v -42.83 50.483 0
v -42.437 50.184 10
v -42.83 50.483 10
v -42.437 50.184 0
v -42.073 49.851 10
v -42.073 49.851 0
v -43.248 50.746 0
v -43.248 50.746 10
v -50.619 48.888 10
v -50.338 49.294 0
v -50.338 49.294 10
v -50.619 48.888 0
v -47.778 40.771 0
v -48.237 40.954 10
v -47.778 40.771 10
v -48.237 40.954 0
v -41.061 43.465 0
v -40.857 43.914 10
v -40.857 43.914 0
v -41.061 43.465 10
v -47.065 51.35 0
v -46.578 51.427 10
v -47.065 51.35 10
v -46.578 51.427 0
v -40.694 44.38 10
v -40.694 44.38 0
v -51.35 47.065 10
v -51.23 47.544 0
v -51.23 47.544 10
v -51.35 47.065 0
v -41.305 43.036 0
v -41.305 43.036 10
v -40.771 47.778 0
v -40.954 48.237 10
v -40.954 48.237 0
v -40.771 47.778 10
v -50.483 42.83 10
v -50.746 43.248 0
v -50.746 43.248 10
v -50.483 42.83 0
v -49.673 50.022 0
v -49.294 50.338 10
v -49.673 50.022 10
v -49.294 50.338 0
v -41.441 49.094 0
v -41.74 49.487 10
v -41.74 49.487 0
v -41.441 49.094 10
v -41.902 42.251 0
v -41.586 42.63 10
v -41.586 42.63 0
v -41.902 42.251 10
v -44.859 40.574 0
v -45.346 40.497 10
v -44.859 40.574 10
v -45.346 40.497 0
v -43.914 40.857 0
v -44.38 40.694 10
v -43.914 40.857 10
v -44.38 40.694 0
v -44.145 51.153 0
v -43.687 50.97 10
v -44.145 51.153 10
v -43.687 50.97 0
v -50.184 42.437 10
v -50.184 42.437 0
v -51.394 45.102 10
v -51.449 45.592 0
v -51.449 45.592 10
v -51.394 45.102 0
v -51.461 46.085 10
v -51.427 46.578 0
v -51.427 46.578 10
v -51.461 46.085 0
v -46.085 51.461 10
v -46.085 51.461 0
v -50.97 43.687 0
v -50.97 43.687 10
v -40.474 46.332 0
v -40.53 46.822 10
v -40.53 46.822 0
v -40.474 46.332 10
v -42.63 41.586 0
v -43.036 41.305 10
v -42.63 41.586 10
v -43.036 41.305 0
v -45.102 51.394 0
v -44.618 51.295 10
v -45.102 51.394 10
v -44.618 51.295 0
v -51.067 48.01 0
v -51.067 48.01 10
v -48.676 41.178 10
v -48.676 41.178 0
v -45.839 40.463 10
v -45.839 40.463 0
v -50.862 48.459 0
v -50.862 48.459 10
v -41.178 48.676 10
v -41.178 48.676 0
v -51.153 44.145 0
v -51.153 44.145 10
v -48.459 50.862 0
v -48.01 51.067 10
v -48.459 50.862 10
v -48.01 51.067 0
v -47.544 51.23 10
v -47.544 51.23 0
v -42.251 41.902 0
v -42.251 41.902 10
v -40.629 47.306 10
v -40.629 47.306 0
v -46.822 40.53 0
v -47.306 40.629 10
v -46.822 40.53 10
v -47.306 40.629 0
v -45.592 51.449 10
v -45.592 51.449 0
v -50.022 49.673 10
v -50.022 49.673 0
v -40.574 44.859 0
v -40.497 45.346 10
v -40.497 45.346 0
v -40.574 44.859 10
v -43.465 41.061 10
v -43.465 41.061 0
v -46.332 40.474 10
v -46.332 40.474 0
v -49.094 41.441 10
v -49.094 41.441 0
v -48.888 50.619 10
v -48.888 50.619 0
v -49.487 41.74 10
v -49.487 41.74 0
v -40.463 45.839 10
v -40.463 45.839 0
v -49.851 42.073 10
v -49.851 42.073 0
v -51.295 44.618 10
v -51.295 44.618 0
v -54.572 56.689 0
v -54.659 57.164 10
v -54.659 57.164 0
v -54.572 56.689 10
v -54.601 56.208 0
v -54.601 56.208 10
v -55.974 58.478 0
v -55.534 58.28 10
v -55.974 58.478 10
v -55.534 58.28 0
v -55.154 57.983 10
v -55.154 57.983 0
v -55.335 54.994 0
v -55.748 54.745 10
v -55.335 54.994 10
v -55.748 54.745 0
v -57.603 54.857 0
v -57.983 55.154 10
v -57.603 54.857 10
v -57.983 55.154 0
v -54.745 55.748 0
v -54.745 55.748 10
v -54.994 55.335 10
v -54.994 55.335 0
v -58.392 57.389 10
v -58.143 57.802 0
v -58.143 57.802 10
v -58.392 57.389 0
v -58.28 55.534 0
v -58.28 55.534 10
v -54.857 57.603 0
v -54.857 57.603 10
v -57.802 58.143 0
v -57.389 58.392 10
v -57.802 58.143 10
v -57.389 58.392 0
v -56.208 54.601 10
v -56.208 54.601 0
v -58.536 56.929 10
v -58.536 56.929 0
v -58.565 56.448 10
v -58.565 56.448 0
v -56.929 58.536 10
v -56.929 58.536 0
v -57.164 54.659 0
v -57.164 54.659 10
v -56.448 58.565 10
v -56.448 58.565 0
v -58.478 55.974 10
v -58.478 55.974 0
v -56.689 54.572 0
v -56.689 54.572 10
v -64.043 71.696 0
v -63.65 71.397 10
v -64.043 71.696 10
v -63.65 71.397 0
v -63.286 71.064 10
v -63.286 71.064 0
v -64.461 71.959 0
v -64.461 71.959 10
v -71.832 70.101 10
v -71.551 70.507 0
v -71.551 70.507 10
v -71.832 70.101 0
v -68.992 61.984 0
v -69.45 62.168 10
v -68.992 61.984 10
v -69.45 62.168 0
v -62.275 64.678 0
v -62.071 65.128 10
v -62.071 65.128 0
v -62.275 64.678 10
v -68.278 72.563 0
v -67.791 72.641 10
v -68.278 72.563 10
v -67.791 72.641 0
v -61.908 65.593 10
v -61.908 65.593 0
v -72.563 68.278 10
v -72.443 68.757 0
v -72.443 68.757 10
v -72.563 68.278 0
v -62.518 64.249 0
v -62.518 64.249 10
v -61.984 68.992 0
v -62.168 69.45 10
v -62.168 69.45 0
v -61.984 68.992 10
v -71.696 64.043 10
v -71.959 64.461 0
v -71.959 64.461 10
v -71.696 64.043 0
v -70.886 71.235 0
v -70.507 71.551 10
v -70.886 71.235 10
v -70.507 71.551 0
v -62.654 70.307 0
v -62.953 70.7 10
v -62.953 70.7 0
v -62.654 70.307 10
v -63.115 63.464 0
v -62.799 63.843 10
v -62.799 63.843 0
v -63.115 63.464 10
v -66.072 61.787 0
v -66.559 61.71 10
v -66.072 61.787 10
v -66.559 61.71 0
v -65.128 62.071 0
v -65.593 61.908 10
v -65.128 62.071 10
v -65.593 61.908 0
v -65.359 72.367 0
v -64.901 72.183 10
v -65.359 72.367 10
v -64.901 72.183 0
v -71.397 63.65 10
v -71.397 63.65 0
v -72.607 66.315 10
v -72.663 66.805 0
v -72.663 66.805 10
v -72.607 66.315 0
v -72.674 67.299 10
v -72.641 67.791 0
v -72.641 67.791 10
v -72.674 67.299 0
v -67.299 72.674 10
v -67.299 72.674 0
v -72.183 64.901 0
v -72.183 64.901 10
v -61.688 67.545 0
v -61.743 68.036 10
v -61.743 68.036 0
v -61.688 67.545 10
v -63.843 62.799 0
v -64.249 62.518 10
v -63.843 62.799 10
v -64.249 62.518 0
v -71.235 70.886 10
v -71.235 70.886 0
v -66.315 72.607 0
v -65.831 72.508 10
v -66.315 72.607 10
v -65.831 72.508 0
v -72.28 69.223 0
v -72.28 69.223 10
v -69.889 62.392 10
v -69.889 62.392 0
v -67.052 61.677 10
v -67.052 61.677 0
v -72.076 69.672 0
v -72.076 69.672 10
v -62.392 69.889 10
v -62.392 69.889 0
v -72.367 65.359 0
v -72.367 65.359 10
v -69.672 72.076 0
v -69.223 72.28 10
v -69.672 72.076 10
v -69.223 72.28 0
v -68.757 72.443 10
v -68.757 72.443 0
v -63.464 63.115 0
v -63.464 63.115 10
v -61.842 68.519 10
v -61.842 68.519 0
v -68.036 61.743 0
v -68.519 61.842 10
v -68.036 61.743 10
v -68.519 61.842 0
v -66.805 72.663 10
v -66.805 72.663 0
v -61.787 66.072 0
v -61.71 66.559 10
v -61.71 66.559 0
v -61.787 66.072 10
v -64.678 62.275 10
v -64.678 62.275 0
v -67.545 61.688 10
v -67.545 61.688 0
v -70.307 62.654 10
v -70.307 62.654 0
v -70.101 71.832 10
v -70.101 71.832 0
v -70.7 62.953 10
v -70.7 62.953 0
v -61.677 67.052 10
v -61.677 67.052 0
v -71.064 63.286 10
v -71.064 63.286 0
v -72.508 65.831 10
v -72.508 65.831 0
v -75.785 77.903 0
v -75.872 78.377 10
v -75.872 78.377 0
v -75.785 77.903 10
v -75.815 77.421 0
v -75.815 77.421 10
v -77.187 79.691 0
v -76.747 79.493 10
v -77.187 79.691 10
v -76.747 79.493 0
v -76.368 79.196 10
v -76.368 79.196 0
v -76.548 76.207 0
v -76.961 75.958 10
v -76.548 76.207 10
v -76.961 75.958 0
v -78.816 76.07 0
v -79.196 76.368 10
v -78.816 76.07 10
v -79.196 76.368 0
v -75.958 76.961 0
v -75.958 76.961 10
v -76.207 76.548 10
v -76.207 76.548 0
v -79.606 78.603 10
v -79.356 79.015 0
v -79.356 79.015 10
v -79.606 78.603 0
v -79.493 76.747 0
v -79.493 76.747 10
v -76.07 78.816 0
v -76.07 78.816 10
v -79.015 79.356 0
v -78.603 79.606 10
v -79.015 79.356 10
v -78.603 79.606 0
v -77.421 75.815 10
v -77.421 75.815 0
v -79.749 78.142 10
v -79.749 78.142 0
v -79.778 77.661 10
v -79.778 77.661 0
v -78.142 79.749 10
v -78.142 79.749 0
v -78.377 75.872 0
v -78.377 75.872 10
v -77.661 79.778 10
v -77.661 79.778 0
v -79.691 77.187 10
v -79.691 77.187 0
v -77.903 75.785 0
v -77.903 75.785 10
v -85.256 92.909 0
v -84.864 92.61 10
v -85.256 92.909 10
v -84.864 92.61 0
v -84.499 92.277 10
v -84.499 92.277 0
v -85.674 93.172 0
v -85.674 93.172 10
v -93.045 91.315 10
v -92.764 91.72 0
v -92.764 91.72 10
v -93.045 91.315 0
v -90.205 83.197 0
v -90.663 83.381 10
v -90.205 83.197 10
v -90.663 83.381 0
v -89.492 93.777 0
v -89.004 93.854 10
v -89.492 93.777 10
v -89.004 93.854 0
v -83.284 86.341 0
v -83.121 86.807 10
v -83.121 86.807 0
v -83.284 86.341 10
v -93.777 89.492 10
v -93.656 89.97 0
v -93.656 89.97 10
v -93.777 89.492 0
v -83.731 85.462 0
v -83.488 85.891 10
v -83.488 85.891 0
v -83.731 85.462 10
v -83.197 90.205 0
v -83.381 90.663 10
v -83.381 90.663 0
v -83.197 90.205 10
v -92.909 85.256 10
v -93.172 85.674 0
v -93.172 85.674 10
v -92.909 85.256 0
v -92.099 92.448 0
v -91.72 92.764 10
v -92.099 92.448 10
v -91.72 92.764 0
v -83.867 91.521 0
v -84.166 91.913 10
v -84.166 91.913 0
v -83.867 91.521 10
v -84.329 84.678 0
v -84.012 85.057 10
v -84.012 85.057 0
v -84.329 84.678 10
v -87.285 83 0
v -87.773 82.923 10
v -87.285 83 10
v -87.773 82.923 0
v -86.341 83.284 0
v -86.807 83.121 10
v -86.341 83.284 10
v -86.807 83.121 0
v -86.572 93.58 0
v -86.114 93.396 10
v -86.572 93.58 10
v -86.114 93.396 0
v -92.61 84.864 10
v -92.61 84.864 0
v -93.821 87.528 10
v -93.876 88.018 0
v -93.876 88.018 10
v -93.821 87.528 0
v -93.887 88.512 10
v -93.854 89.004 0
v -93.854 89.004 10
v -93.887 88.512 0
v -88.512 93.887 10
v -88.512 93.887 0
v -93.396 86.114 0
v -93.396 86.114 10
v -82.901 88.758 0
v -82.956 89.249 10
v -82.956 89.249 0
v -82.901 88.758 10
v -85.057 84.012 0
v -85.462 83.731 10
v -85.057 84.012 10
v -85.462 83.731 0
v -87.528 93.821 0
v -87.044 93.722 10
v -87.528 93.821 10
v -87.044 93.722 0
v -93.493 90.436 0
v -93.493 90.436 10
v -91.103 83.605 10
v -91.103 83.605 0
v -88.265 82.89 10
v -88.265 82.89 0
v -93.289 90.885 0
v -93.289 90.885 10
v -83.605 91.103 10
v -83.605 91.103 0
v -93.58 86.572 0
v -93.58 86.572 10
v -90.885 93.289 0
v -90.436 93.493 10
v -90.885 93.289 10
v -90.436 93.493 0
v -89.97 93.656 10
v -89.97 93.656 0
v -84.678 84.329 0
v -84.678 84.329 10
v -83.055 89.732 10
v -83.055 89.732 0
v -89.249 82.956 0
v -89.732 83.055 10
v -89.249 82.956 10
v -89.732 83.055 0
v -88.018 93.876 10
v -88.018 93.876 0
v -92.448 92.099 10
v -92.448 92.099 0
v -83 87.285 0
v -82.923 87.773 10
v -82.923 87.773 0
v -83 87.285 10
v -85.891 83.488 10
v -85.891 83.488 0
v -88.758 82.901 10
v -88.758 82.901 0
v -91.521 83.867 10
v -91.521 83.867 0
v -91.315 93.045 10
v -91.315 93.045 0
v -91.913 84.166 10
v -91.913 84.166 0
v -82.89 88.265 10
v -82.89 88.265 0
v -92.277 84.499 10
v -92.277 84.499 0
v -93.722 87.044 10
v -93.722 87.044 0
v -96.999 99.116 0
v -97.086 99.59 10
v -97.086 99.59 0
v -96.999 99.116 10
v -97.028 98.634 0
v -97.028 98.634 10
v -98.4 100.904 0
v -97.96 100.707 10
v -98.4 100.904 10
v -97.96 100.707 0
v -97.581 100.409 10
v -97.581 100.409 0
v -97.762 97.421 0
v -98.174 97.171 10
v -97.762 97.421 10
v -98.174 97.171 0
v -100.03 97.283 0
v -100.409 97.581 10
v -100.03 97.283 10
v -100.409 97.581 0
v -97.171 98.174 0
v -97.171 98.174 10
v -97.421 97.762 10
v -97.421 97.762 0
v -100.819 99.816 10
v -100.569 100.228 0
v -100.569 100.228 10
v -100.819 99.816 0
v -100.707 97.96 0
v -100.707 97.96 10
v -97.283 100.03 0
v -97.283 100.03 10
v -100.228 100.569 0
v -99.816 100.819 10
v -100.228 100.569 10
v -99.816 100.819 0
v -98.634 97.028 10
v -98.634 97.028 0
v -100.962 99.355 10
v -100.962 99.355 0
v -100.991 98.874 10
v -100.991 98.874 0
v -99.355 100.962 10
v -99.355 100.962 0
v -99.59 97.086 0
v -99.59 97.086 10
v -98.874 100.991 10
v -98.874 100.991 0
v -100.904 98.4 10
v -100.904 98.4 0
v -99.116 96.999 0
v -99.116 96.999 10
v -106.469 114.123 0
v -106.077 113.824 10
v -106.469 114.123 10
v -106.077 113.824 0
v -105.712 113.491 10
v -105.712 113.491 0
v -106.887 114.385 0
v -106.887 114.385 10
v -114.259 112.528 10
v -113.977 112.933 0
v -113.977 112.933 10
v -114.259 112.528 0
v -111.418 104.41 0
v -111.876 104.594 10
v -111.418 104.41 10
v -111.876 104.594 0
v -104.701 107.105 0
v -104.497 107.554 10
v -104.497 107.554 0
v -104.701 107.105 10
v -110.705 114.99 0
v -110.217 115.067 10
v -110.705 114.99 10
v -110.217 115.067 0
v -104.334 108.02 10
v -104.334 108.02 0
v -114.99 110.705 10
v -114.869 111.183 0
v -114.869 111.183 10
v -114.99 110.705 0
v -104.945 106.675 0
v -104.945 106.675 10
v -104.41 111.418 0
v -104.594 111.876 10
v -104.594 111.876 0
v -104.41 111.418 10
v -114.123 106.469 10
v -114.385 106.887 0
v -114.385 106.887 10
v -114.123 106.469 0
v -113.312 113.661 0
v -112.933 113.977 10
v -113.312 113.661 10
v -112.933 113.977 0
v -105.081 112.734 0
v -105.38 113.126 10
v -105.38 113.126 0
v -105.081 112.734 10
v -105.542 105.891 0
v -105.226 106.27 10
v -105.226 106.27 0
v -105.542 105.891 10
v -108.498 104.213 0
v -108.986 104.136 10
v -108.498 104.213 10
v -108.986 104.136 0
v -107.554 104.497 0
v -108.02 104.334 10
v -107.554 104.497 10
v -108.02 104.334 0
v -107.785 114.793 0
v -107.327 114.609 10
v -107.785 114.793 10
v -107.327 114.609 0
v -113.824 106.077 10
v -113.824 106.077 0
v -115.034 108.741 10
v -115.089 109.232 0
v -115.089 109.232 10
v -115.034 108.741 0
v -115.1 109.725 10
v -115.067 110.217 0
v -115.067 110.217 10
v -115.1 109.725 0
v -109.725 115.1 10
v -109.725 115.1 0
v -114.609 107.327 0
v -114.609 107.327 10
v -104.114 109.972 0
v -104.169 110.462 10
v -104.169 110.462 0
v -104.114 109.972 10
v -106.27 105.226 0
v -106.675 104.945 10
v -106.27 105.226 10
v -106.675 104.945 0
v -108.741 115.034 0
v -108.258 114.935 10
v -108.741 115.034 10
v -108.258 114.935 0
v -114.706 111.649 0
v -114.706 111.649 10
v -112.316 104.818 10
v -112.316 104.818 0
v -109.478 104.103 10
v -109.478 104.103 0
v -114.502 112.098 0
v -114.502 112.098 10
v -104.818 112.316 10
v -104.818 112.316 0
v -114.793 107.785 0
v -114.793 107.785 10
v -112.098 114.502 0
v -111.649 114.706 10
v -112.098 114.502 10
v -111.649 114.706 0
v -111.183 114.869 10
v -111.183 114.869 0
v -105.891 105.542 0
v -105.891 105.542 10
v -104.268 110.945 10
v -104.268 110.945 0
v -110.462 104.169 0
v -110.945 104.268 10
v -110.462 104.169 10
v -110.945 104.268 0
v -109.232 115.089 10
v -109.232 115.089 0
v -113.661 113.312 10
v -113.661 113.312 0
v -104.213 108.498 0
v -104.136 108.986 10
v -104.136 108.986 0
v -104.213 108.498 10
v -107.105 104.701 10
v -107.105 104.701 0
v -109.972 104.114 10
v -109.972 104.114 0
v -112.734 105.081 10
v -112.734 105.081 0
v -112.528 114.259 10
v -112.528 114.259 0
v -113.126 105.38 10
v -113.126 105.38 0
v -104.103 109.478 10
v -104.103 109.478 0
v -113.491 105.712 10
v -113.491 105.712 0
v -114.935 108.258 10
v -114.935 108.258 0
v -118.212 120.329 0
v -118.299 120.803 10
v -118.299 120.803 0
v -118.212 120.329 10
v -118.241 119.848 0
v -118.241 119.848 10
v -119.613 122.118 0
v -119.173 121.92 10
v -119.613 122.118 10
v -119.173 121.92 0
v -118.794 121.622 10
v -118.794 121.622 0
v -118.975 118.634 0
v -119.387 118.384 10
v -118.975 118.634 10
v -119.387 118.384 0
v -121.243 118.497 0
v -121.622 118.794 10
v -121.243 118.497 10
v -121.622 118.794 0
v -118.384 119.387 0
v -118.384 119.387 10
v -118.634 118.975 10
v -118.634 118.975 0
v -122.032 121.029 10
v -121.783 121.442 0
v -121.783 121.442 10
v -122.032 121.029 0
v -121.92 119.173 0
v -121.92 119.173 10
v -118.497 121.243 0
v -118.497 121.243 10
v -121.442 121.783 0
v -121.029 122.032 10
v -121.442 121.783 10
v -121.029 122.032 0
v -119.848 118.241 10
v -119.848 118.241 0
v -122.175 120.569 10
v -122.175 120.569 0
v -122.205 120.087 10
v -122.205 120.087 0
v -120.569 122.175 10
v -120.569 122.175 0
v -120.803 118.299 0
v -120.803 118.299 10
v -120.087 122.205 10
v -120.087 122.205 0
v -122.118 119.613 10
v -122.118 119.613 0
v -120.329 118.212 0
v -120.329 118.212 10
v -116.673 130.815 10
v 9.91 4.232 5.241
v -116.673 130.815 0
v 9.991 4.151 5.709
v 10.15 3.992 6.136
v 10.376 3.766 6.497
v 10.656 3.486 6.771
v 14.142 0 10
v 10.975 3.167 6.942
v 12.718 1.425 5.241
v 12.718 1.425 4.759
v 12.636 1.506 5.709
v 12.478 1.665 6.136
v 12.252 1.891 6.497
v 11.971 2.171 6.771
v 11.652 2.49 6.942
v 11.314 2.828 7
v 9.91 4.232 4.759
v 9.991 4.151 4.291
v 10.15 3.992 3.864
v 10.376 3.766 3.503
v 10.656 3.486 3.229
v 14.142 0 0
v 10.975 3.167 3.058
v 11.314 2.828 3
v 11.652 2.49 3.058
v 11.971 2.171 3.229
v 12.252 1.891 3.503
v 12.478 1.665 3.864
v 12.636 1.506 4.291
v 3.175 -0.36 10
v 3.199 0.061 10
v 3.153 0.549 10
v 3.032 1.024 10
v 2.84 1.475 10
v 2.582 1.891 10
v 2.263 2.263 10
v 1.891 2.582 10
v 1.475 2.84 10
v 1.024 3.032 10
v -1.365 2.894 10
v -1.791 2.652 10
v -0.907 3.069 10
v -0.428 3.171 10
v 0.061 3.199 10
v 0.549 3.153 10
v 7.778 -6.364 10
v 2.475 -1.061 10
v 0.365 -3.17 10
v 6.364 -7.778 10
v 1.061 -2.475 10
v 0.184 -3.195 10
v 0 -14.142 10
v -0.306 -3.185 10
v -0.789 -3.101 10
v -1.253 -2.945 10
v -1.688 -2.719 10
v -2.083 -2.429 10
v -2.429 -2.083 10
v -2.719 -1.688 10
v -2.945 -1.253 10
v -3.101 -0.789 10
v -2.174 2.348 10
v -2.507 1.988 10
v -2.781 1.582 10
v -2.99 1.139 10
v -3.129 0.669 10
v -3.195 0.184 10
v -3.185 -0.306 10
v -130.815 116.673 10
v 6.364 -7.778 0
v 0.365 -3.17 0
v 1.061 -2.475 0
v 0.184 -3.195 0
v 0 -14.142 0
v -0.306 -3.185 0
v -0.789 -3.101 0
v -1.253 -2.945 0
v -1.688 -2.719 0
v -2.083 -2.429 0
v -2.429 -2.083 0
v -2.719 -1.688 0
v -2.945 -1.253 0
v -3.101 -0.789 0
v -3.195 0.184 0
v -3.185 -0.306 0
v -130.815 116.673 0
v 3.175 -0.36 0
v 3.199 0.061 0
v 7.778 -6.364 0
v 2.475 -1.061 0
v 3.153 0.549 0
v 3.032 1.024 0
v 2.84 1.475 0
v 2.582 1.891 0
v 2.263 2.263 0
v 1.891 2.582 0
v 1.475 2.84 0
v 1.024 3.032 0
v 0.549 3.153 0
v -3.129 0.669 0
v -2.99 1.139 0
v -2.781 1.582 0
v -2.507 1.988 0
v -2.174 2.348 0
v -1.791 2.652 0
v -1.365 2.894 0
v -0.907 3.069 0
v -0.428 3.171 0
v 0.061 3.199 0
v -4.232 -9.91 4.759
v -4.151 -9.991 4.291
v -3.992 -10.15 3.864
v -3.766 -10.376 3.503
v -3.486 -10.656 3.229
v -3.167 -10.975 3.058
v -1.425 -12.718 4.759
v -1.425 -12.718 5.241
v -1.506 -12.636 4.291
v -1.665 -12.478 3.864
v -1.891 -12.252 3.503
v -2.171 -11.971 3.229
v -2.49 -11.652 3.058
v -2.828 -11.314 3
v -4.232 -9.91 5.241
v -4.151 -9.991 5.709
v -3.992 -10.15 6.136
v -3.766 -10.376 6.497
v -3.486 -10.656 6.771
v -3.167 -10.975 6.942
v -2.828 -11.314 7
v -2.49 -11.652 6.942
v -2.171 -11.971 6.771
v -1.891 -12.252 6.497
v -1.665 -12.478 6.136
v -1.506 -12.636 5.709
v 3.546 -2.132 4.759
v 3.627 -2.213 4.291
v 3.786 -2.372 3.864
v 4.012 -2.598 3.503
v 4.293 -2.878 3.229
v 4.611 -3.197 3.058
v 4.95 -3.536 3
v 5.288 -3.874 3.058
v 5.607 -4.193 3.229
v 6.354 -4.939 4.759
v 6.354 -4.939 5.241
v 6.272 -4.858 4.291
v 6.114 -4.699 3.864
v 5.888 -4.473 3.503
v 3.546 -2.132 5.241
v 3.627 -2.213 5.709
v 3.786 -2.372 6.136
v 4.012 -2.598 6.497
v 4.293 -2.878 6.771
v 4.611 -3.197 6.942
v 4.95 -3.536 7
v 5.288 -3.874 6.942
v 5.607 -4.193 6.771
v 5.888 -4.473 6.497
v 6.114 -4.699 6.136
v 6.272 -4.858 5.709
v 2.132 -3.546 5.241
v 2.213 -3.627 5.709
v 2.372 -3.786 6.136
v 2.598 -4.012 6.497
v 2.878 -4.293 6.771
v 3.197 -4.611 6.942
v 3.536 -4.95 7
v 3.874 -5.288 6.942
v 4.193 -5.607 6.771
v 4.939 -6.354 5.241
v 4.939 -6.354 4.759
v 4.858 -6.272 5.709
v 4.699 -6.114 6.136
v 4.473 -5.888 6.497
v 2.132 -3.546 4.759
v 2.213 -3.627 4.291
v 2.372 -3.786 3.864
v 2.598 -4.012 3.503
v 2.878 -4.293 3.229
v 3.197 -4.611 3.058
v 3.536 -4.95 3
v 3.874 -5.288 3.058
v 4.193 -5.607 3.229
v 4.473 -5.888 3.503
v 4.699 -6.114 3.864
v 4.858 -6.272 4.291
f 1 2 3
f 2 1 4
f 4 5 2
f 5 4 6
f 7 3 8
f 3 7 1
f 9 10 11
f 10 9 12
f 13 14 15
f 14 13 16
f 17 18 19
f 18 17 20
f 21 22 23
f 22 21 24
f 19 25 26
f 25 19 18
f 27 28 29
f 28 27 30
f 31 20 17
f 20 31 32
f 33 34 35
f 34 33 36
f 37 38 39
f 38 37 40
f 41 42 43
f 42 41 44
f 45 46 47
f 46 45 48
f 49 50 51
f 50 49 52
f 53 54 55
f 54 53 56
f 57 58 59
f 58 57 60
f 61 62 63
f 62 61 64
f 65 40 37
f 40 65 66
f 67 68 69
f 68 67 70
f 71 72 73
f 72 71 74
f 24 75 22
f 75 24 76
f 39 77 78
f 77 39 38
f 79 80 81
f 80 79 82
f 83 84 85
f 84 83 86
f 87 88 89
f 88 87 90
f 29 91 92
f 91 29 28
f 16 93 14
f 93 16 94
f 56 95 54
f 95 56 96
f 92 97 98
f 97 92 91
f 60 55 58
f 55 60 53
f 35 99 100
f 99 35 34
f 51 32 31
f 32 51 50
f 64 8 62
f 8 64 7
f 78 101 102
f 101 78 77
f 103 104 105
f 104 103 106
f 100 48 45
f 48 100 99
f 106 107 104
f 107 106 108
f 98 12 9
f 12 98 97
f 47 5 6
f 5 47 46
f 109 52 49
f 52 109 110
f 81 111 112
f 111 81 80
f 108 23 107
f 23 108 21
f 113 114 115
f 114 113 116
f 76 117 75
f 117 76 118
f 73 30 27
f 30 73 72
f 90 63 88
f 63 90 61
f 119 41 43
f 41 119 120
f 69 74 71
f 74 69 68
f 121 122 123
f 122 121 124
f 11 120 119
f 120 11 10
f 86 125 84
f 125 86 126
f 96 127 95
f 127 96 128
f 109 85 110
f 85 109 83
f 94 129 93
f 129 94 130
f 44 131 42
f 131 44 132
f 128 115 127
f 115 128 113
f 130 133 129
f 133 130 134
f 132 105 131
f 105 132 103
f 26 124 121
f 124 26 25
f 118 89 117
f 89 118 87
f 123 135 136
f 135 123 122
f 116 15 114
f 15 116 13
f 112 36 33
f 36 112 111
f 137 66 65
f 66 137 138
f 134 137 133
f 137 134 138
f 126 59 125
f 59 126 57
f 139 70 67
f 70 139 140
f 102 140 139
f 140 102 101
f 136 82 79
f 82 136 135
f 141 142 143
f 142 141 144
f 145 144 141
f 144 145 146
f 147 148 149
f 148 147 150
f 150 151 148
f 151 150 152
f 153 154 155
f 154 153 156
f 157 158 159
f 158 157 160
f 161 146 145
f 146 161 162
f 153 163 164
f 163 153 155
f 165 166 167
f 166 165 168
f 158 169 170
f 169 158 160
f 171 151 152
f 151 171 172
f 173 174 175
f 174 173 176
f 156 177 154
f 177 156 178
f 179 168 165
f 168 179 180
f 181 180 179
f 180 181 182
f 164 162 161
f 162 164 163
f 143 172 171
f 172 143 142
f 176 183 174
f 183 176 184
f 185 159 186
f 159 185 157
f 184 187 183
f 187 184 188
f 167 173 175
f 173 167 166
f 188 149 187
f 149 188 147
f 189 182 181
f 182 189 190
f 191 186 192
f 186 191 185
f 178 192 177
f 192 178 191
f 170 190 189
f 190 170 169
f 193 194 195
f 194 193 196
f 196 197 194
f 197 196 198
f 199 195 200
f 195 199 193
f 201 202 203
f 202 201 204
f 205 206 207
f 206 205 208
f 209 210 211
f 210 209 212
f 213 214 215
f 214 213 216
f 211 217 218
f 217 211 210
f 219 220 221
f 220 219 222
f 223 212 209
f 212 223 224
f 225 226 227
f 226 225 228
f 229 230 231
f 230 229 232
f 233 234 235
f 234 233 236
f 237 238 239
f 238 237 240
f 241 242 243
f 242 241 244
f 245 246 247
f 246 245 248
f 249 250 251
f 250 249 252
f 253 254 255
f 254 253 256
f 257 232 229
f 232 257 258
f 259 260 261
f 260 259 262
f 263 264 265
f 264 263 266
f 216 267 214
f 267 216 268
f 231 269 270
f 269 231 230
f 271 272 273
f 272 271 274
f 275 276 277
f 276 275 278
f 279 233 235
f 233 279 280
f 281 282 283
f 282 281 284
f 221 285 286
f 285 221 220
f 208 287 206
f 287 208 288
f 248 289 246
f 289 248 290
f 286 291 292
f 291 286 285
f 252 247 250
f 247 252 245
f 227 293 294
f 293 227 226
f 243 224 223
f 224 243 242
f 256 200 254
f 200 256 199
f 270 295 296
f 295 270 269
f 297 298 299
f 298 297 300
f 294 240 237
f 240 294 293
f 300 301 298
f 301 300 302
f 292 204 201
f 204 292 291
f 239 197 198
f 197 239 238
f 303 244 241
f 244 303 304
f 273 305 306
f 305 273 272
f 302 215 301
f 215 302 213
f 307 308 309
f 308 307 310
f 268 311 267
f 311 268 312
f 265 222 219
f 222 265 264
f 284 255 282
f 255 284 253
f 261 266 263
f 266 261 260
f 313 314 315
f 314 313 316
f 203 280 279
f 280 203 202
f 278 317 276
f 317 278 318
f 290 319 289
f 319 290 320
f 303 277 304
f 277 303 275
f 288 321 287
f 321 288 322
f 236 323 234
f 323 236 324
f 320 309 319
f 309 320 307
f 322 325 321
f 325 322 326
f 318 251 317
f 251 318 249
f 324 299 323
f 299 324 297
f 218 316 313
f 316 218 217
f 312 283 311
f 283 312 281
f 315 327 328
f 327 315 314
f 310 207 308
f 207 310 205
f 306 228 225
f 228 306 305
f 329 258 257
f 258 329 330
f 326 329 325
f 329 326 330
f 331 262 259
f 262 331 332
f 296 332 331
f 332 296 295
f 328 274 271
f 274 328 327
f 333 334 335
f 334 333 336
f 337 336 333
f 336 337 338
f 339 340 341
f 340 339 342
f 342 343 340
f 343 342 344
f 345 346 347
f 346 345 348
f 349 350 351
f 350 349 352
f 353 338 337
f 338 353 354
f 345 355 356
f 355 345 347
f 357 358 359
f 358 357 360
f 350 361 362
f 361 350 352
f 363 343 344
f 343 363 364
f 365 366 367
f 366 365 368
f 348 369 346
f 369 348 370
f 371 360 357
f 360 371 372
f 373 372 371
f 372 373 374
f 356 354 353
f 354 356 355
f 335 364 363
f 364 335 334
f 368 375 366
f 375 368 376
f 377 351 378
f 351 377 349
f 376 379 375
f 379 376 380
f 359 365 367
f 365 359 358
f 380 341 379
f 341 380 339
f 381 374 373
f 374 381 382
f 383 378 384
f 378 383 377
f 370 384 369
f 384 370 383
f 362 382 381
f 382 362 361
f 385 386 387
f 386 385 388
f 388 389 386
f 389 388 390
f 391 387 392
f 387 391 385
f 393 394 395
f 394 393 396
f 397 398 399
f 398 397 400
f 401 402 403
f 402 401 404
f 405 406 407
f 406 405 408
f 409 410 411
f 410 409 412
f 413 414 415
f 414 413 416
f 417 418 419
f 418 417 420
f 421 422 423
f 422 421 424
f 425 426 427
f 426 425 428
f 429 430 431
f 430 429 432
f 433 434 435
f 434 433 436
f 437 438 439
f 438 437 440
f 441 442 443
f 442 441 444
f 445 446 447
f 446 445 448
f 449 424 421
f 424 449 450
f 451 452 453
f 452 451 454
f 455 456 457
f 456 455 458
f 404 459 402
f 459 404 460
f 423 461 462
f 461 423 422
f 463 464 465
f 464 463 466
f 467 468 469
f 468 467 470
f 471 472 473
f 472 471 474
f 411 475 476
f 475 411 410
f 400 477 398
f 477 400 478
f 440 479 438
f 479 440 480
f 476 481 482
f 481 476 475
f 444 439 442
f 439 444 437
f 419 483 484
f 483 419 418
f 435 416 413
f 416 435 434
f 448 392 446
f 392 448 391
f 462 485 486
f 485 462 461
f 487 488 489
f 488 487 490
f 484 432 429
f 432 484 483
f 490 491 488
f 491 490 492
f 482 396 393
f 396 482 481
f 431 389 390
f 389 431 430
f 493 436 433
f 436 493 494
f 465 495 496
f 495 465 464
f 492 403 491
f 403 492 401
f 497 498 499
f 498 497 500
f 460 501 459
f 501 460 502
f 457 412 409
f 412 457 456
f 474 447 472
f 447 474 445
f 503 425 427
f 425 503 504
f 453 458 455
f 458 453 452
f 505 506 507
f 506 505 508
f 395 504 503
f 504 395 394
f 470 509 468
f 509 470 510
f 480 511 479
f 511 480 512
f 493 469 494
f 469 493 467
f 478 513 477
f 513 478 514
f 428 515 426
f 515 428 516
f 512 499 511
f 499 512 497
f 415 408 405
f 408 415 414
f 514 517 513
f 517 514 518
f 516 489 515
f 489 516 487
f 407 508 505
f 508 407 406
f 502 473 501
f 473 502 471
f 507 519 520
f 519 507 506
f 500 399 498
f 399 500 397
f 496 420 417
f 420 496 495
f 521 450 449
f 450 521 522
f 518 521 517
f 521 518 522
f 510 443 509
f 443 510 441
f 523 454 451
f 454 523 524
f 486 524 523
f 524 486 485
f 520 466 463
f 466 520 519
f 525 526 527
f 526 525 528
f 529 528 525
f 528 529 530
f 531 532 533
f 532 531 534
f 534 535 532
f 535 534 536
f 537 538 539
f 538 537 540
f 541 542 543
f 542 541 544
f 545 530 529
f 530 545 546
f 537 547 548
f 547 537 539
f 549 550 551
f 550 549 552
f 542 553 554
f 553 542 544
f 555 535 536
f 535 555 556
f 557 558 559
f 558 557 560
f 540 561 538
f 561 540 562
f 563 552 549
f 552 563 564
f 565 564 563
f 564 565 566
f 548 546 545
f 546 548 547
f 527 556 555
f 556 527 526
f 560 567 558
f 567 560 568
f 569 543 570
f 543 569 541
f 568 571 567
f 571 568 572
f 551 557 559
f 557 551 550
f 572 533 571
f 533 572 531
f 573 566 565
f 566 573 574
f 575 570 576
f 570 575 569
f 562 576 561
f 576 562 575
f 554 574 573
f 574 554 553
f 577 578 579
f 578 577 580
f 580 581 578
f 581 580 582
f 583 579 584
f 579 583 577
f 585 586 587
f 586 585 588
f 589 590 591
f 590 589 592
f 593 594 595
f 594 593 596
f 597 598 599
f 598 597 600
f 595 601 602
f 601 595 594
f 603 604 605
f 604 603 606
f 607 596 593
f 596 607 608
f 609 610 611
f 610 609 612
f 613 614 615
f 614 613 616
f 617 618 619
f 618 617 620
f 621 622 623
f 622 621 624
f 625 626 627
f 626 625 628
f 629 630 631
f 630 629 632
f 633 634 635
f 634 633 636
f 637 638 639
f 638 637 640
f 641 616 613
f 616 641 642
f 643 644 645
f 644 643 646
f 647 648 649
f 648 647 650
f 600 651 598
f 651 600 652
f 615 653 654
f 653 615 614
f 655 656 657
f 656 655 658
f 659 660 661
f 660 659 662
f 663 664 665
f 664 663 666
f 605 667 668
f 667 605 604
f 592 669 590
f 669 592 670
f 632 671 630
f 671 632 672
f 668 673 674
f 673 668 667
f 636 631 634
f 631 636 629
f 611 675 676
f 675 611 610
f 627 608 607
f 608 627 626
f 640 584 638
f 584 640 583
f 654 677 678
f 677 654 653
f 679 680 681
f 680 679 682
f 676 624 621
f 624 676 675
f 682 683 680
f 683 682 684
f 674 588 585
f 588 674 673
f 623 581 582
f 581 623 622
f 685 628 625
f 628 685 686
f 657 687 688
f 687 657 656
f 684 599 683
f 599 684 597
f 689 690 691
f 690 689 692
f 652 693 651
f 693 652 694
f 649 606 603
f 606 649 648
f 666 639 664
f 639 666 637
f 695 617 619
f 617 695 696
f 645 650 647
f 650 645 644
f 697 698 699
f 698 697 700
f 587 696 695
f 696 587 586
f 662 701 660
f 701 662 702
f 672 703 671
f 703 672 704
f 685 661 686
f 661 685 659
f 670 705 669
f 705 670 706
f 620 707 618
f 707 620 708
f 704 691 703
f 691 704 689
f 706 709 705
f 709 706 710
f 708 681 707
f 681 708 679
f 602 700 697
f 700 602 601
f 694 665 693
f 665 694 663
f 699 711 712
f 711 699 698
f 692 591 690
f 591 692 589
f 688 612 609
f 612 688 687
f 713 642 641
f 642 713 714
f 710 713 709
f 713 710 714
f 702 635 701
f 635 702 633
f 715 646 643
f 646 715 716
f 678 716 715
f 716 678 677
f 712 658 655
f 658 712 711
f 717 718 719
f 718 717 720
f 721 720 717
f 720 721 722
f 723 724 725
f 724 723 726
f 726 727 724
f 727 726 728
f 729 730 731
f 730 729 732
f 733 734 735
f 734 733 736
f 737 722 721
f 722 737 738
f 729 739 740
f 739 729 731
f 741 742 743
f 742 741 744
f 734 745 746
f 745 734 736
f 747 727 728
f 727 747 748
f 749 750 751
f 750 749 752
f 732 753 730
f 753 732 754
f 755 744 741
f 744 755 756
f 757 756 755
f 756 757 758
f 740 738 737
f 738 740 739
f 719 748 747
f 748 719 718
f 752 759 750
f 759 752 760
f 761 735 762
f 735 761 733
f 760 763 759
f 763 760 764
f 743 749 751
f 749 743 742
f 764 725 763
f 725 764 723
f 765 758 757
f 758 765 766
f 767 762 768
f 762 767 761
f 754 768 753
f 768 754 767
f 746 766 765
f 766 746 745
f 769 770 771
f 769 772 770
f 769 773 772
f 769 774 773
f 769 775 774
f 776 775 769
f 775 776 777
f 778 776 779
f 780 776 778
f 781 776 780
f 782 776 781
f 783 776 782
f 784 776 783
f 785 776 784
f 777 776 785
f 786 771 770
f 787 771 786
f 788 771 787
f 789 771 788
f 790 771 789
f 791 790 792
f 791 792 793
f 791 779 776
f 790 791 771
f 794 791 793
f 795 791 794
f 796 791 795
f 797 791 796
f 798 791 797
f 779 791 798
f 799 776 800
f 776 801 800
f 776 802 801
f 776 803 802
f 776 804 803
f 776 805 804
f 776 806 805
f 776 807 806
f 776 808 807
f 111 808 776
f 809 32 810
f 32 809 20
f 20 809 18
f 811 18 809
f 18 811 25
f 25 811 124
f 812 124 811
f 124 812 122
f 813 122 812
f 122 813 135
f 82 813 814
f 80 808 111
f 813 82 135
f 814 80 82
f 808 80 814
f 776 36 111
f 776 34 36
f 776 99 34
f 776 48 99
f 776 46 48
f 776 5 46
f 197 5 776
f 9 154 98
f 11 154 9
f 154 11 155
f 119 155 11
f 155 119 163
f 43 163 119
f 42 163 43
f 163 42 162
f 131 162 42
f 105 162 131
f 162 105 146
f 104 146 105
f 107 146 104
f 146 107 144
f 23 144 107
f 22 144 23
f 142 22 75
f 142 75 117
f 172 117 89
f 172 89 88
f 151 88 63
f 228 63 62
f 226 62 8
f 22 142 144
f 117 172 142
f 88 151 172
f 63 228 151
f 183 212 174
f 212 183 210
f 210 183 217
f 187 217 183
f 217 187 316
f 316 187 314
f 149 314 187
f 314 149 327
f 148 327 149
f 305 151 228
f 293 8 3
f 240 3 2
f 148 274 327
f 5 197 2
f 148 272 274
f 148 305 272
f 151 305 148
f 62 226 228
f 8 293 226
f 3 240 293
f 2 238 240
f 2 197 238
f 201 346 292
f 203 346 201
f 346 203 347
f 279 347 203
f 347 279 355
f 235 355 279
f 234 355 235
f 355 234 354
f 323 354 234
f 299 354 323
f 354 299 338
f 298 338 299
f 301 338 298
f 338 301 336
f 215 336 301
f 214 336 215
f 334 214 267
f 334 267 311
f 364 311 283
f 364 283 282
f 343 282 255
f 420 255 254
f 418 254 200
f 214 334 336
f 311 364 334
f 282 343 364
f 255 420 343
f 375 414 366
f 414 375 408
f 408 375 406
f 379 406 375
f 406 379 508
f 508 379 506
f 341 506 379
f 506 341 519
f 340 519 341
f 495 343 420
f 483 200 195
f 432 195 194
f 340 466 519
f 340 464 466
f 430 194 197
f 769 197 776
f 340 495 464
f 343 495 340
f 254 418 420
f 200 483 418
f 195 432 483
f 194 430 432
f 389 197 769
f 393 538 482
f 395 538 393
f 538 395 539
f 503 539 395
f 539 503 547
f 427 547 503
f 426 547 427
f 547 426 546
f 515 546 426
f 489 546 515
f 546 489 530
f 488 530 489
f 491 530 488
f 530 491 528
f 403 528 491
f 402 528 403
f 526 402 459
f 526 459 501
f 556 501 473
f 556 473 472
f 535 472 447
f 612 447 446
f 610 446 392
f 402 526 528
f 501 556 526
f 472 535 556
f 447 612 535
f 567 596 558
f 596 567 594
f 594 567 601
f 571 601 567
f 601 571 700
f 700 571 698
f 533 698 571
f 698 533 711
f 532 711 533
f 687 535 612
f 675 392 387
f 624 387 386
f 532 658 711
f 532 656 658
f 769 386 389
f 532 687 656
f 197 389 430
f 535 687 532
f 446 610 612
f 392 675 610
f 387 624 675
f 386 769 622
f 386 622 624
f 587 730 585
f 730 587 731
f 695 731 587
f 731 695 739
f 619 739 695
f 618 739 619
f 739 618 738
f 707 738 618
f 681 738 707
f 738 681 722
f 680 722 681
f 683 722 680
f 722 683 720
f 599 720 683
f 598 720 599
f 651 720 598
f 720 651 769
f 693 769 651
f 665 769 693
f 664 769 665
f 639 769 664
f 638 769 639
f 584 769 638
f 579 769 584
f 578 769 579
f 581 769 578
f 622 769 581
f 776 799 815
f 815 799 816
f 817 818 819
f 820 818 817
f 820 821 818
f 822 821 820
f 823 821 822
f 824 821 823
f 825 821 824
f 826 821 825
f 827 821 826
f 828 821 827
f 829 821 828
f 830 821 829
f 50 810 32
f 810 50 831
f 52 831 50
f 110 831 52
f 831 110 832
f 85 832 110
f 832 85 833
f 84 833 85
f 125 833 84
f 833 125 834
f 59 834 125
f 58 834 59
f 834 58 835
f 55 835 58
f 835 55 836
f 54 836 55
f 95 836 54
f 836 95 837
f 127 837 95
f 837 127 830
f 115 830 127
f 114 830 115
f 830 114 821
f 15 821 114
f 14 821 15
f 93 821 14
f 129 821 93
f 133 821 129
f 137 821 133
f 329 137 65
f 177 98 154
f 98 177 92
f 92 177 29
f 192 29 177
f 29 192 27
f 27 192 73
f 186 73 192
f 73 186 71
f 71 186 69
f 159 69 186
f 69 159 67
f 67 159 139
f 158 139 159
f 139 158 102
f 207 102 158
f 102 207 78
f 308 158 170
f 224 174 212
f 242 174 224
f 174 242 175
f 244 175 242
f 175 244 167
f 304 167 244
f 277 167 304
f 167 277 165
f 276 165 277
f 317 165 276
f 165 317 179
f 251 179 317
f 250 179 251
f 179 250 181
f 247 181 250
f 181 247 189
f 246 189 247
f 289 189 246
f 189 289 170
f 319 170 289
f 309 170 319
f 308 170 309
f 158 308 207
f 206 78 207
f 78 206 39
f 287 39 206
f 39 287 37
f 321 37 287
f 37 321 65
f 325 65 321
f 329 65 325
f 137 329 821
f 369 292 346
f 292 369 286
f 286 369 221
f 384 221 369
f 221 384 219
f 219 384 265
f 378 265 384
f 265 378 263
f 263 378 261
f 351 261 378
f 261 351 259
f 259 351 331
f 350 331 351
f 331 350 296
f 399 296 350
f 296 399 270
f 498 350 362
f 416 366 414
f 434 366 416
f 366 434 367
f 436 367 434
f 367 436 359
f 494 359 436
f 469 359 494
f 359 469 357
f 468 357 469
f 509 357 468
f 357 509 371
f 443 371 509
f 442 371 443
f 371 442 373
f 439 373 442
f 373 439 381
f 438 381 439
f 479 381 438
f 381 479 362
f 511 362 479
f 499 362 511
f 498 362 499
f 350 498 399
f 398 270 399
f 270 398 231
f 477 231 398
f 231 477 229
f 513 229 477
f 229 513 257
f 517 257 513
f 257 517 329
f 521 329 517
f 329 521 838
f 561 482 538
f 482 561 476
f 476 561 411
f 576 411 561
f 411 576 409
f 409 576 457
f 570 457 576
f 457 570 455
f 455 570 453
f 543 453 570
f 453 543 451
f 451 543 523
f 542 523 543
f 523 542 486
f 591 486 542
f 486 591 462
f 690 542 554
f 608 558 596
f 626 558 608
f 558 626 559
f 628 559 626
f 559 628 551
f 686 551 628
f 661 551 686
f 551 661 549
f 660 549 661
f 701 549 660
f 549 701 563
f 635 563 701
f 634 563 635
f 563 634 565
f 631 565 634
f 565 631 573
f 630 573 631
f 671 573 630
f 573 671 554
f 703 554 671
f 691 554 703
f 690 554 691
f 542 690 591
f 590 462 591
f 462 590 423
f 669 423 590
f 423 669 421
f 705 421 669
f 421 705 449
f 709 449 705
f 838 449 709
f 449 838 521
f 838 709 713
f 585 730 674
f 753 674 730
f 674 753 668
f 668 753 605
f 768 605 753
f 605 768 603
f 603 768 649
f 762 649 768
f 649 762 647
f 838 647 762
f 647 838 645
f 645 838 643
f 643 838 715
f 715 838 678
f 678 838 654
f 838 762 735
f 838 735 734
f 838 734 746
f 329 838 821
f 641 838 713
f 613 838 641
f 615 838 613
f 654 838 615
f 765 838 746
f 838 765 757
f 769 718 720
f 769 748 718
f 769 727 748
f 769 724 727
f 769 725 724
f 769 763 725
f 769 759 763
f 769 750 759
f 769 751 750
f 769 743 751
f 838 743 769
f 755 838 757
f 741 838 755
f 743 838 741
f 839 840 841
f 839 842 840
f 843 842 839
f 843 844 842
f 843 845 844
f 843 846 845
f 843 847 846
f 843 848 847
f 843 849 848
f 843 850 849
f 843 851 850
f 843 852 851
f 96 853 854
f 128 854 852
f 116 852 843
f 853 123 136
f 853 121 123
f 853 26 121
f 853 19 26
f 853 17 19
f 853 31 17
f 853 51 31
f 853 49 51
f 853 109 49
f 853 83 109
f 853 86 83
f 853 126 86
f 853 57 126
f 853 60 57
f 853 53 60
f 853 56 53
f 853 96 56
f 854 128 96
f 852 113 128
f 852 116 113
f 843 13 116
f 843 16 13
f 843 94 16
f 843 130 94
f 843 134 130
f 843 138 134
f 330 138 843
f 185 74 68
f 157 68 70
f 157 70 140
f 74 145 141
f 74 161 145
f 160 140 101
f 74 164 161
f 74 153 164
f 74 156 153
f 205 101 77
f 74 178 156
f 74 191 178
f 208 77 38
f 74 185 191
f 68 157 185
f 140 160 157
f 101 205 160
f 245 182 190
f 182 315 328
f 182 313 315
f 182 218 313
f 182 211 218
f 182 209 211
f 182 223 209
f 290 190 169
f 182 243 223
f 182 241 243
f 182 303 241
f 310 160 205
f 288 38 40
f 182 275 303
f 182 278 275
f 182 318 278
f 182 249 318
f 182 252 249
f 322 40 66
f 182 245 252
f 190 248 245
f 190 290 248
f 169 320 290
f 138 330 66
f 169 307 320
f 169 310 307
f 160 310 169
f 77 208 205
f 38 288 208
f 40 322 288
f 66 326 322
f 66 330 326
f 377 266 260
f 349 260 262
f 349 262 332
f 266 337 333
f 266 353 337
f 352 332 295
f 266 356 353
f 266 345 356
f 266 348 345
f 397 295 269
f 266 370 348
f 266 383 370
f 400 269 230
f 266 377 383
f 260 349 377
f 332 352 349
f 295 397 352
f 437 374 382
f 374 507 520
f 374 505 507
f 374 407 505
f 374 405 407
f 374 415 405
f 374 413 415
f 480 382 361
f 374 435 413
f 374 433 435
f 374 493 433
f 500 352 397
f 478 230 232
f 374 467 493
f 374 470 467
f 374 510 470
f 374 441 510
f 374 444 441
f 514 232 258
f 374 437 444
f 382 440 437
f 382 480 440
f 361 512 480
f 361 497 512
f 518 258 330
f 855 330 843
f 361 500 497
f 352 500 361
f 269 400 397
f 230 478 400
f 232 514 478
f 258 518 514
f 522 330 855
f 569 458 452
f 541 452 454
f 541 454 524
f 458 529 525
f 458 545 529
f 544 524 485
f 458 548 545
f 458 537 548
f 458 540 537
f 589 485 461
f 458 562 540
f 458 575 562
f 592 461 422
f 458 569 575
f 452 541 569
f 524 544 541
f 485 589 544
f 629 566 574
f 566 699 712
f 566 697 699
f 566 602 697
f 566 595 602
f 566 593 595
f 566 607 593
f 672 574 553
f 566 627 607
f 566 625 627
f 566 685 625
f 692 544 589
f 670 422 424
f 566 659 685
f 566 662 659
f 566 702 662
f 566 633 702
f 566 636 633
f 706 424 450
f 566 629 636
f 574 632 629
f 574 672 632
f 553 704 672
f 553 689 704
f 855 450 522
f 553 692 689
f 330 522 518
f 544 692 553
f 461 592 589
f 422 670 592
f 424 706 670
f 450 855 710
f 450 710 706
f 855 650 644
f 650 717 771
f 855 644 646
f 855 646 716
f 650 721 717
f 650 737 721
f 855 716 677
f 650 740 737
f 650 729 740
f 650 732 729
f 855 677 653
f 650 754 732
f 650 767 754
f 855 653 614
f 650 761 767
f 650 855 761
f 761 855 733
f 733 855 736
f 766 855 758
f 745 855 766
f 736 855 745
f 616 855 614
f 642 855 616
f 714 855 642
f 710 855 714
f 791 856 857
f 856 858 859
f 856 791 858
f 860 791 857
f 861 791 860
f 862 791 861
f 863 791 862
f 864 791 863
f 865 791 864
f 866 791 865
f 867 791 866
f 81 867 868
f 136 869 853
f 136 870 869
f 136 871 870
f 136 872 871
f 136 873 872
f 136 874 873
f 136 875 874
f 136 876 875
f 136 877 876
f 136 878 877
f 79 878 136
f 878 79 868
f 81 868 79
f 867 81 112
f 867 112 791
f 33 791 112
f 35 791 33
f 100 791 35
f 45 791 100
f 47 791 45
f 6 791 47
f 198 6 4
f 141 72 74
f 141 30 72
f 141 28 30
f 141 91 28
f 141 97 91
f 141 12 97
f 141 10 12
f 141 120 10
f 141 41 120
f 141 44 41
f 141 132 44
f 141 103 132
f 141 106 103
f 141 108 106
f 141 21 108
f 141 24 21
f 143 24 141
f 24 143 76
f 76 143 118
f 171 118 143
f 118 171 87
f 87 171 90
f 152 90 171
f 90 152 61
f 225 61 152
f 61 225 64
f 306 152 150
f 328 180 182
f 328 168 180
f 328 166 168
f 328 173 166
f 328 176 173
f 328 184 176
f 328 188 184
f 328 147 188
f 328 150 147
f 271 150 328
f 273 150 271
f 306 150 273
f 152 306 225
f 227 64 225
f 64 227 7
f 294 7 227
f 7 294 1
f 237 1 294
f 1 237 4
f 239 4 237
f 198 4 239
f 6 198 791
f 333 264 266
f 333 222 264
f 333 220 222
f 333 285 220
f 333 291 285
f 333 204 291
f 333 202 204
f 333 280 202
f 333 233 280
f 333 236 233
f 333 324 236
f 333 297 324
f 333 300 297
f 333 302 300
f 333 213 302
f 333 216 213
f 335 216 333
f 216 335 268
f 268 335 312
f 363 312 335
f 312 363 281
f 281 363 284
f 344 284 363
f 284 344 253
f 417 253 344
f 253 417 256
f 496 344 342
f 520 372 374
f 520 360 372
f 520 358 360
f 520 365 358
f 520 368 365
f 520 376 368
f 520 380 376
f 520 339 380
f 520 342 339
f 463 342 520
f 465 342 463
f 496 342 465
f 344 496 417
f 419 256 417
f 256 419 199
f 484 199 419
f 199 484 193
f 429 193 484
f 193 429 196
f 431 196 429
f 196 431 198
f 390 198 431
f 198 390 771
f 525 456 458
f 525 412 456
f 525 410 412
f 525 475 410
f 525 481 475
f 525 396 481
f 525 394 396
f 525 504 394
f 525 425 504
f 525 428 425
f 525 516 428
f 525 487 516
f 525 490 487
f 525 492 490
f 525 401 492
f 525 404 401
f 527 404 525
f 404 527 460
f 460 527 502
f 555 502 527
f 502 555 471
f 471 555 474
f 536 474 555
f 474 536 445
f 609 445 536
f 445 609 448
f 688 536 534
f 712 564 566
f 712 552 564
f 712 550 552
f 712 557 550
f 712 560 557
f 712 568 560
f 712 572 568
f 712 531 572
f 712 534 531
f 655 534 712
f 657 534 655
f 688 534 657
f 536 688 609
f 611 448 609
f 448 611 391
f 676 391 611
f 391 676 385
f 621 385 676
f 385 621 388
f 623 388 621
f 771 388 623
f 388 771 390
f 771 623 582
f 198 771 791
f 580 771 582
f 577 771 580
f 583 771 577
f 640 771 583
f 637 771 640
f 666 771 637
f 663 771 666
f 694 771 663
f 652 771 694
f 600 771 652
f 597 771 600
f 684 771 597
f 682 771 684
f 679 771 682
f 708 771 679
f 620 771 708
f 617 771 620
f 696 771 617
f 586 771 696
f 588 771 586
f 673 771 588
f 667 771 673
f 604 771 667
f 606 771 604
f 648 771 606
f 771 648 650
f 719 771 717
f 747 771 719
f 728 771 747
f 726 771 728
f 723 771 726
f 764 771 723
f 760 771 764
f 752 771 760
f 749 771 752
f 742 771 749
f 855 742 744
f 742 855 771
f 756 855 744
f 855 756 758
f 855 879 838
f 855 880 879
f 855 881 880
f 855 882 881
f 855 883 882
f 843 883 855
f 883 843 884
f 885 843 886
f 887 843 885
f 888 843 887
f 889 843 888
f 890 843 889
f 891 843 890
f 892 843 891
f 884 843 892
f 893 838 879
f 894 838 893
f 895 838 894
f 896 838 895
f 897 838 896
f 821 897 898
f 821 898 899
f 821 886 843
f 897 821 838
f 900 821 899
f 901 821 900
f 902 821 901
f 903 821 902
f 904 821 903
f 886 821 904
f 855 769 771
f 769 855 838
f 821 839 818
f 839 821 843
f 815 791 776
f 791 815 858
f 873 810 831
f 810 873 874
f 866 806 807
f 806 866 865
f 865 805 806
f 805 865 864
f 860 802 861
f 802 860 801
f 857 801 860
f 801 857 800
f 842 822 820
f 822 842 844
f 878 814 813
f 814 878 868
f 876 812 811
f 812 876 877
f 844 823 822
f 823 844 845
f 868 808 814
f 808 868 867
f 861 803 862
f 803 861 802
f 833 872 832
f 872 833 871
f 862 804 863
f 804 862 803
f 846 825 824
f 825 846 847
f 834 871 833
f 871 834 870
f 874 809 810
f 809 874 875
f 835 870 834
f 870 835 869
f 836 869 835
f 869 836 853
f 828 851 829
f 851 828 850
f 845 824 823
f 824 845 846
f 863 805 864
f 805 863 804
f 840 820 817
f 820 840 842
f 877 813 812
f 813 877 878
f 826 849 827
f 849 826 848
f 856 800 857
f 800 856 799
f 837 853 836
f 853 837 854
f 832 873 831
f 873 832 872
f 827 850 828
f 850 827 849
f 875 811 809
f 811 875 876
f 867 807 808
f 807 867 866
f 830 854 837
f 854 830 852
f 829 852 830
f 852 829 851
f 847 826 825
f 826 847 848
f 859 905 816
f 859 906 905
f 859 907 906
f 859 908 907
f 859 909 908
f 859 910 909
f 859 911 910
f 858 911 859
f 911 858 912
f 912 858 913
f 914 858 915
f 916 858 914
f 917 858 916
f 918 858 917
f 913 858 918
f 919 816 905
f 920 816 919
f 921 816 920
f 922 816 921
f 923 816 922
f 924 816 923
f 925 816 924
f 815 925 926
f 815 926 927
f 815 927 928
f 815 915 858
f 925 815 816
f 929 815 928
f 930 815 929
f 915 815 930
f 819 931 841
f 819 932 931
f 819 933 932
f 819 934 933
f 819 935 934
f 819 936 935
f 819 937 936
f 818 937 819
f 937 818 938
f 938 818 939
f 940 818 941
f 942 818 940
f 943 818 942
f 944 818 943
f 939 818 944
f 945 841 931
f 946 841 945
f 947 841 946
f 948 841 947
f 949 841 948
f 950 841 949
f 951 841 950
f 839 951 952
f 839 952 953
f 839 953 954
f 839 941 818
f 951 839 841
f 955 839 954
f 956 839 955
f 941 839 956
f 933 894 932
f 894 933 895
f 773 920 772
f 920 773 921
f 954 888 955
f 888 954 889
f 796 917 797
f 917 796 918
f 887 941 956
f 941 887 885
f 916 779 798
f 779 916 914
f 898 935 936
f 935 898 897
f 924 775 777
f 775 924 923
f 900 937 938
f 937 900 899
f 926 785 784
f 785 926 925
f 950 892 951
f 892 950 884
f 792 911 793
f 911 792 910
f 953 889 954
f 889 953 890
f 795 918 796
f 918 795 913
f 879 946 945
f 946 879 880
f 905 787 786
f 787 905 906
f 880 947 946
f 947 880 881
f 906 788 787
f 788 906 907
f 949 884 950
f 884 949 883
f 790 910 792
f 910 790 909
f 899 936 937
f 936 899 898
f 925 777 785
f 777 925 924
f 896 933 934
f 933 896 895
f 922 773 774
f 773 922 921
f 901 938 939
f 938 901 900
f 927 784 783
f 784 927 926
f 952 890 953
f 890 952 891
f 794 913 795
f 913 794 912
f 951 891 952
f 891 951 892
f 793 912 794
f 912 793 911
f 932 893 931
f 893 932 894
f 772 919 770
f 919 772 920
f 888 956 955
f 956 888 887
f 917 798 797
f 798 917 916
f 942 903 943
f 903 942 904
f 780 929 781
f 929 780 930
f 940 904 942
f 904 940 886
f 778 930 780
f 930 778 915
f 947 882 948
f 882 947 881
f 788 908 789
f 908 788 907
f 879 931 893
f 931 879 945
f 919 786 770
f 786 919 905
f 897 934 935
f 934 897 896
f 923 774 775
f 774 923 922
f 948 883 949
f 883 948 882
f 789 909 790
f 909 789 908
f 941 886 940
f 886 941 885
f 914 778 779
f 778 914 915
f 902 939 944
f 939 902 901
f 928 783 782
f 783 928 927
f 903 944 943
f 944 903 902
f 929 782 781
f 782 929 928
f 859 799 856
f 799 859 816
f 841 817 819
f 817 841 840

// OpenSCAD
use <../../config.scad>

resolution = 4; $fs=$fs/resolution; $fa=$fa/resolution;

lg =28;
l=28;


module tige(){
    difference(){
        translate([-10, -10]) cube([20,185,10]);
        
        translate([0, 0, -1]) cylinder(r=3.2, 100, center = true);
        for(i=[1:4]){
            translate([0, 35+i*30, 0]) cylinder(r=5.5, 100, center = true);
            translate([0, 35+15+i*30, 0]) cylinder(r=2, 100, center = true);
        }
        translate([-1, -21,-1]) cube([2,20,12]);
        translate([0, -6, 5]) rotate([0,90,0]) cylinder(r=2, 100, center = true);
        
    }
    if(true){
        rotate([0,0,180])
        difference(){
            translate([-5, 2.5, 0]) cube([10,1,10]);;
            translate([-1, -1,-1]) cube([2,20,12]);
        }
    } else {
        translate([-5, 2.5, 0]) cube([10,1,10]);;
    }
        
                
}

module support(){
    difference(){
        union(){
            translate([-40, 0]) cube([80,25,20]);
            for(i=[0,1]){
                mirror([i,0,0])translate([15, 5, 20]) cube([20,15,20]);
            }
        }
        
        for(i=[0,1]){
            mirror([i,0,0])translate([25, 12.5, -1]) cylinder(r=2.2, 100, center = true);
        }
        for(i=[0,1]){
            translate([7,0]) mirror([i,0,0])translate([25, 10, 10]) rotate([90,0,0]) cylinder(r=4.5, 100, center = true);
        }
        
    }
                
}

module support_tme(){
    difference(){
        union(){
            translate([-40, 0]) cube([80,30,20]);
        }
        
        for(i=[0,1]){
            mirror([i,0,0])translate([16, 23, -1]) cylinder(r=2.2, 100, center = true);
        }
        for(i=[0,1]){
            mirror([i,0,0])translate([25, 10, 10]) rotate([90,0,0]) cylinder(r=4.5, 100, center = true);
        }
        
    }
                
}

mode=1;
if(mode==0){
   support();
} else {
   rotate([0,0,45])tige(); 
}
